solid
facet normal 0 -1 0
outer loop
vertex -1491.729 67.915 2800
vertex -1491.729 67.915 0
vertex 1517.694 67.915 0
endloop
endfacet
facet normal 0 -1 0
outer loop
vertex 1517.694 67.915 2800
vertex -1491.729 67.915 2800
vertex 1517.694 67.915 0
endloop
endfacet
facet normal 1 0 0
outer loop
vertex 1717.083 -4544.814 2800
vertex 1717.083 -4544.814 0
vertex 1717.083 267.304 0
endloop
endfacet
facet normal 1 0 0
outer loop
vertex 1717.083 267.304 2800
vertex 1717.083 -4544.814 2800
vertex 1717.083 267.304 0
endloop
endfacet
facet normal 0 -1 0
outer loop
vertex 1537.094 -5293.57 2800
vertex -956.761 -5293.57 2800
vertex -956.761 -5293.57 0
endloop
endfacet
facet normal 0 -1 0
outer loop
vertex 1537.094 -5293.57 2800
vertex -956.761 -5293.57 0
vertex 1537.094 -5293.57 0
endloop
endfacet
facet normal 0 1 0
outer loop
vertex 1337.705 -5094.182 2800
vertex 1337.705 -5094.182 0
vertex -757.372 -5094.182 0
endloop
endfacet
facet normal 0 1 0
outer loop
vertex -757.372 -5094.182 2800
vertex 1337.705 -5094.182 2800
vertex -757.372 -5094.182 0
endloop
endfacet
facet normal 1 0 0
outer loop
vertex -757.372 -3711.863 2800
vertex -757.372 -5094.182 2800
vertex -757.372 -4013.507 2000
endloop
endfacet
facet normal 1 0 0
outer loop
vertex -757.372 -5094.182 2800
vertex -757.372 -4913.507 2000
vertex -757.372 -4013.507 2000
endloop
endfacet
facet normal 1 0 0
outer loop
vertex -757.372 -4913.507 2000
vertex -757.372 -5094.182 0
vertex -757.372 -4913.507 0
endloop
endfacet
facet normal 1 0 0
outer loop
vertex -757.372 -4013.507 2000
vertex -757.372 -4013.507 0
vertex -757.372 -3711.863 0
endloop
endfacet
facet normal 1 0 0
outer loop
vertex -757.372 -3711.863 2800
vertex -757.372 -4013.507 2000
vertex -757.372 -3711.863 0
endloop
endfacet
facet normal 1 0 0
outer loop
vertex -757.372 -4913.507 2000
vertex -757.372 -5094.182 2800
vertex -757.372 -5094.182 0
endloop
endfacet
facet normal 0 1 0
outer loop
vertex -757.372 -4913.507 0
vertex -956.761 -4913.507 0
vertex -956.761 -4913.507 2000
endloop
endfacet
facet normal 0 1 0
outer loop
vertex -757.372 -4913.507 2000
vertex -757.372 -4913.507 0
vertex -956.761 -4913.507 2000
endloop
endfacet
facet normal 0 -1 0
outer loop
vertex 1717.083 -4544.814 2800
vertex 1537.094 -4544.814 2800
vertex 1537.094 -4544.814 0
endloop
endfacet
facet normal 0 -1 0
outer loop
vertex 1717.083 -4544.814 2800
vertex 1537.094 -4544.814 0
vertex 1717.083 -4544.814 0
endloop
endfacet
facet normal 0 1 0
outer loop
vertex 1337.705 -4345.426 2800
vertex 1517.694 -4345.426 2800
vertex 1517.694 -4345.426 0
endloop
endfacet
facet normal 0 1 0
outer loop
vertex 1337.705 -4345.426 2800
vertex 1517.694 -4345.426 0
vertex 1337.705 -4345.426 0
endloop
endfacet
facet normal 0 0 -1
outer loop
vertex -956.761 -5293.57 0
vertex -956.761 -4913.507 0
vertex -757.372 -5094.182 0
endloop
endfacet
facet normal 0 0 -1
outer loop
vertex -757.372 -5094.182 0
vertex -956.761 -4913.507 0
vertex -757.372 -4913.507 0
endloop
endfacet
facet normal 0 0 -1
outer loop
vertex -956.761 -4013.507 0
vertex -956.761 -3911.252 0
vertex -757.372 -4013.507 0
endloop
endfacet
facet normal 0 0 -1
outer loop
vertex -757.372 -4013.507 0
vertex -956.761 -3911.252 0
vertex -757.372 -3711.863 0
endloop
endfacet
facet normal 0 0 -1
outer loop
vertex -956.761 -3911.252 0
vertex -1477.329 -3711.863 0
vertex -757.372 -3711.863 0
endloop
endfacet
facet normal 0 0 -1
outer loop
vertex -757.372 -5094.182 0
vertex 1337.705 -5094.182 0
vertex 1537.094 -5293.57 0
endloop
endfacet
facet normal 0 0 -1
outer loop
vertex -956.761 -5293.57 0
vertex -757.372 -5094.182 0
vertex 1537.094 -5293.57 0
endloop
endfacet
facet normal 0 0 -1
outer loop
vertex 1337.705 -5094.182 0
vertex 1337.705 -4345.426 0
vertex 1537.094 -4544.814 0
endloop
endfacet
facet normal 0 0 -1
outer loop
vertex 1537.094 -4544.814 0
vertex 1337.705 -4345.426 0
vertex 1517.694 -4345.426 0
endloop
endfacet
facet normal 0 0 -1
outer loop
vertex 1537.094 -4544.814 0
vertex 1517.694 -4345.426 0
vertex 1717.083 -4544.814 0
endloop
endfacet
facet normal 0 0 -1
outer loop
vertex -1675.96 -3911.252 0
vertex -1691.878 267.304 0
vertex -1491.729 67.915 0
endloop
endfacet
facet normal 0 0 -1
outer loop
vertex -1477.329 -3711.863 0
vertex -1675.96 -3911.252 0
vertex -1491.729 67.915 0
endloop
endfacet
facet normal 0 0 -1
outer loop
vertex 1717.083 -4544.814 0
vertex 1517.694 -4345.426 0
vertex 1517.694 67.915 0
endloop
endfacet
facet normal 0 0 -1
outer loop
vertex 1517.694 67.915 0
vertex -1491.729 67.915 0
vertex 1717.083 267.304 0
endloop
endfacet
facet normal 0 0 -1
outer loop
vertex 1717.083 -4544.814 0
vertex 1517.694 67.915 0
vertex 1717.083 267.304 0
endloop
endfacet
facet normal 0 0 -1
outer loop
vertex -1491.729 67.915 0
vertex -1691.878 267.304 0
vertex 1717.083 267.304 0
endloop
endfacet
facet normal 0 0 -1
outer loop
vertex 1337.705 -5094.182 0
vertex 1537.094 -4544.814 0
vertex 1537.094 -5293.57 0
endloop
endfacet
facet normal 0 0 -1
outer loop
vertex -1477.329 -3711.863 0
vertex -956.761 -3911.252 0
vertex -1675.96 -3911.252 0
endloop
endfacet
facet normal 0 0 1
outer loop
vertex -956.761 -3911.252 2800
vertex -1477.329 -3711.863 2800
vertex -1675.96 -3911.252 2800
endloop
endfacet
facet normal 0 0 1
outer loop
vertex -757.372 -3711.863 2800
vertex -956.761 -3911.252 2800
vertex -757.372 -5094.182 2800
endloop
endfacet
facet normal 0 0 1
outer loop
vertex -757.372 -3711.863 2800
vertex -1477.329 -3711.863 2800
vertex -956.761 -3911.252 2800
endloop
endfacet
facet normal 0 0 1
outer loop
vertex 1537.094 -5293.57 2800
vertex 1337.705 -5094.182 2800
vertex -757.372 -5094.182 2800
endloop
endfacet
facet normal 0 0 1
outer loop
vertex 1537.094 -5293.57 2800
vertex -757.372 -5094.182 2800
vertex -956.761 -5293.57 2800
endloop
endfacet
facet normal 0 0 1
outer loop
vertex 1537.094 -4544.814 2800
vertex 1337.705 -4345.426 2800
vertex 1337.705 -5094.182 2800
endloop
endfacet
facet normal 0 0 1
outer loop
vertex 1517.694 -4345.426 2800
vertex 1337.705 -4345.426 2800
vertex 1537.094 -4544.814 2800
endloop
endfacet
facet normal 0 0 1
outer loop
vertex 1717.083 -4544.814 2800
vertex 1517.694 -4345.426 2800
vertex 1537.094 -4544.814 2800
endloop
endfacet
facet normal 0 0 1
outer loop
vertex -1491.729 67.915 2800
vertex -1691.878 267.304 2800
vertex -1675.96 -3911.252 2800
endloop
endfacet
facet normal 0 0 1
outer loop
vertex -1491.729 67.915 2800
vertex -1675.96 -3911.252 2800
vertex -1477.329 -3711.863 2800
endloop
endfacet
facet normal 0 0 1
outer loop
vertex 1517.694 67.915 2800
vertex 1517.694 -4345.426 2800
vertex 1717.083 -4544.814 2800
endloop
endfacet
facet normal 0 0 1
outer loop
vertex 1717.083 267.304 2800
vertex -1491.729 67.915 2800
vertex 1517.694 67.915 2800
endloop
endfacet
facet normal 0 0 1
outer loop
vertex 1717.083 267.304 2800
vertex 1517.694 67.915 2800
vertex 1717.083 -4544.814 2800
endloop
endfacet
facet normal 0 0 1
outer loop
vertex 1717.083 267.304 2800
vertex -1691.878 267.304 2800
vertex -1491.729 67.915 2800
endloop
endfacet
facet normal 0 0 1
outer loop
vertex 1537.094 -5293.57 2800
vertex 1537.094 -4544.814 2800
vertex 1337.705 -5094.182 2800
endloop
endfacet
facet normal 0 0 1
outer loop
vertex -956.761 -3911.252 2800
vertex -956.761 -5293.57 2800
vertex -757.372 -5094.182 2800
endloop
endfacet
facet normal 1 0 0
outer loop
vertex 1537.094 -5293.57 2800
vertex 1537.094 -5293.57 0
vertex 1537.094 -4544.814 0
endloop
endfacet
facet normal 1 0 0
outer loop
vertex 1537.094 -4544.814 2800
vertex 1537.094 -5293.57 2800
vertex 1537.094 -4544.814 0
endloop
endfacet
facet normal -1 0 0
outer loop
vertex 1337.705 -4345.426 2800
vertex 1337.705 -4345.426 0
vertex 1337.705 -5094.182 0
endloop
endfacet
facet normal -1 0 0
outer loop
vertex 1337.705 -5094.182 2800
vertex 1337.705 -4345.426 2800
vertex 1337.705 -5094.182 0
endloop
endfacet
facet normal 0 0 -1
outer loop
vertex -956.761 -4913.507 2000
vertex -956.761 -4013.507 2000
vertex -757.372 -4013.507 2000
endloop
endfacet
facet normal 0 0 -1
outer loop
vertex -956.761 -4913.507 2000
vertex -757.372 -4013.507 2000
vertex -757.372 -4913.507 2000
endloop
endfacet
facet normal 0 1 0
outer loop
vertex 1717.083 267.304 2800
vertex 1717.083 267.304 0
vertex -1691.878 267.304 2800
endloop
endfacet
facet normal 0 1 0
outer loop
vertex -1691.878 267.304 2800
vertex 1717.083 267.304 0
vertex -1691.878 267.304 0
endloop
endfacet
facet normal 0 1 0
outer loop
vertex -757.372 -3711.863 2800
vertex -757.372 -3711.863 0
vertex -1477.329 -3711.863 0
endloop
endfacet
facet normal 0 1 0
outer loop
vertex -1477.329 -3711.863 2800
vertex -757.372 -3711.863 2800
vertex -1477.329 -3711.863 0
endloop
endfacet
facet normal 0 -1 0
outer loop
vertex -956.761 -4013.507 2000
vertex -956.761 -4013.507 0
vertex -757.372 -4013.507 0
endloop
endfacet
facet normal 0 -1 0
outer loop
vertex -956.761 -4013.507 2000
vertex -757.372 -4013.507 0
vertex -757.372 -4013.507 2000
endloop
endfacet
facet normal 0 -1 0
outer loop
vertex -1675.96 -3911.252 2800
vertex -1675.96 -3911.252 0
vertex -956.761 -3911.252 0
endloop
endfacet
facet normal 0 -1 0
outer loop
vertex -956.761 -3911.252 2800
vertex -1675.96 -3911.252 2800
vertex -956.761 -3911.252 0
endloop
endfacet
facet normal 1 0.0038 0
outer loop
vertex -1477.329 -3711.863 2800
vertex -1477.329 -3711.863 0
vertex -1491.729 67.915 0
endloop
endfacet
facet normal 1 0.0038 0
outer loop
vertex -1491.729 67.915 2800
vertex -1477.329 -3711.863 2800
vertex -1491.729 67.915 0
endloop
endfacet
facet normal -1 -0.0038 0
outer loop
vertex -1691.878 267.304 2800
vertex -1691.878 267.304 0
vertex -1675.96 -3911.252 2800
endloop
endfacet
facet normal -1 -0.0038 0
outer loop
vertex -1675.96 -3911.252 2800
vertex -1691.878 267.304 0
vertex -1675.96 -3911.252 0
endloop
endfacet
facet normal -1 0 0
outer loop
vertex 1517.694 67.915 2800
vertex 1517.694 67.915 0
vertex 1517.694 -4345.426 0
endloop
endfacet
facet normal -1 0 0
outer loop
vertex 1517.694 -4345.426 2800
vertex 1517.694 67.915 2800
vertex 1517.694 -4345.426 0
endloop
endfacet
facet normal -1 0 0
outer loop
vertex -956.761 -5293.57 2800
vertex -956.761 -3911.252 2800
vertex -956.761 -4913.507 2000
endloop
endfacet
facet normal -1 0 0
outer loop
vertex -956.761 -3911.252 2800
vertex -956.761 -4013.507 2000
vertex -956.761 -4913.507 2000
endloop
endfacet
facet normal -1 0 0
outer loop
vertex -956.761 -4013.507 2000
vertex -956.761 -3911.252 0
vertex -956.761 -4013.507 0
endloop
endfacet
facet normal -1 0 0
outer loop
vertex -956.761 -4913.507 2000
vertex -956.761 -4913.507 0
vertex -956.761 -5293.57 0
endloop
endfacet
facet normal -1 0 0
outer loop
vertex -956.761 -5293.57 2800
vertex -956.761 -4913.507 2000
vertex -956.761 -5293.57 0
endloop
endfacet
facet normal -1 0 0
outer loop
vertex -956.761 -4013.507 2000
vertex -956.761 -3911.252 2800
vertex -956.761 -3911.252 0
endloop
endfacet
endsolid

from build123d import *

# Parameters (mm, degrees)
F1_DEPTH = 2800
F2_W     = 900
F2_H     = 2000
F3_DEPTH = 199.3887424469


# Not quite as in the source:
# - a feature of the source that left no trace in its solid (it failed there, or was rolled back) is left out


with BuildPart() as f1:
    # F0 (on Top) → F1 (new body)
    with BuildSketch(Plane.XY):
        Polygon((1537.0936393738, -5293.5702800751), (1537.0936393738, -4544.8143482208), (1717.0830965042, -4544.8143482208), (1717.0830965042, 267.3035189509), (-1691.8783106137, 267.3035189509), (-1675.9599854953, -3911.2515449524), (-956.7605257034, -3911.2515449524), (-956.7605257034, -5293.5702800751), align=None)
        Polygon((-757.3717832565, -3711.8628025055), (-1477.3293733597, -3711.8628025055), (-1491.7285442352, 67.914776504), (1517.6943540573, 67.914776504), (1517.6943540573, -4345.4256057739), (1337.7048969269, -4345.4256057739), (1337.7048969269, -5094.1815376282), (-757.3717832565, -5094.1815376282), align=None, mode=Mode.SUBTRACT)
    extrude(amount=F1_DEPTH)

    # F2 (on face) → F3 (cut, through all)
    with BuildSketch(Plane(origin=(-956.7605257034, 0, 0), x_dir=(0, -1, 0), z_dir=(-1, 0, 0))):
        with Locations((4463.5073661804, 1000)):
            Rectangle(F2_W, F2_H)
    extrude(amount=-F3_DEPTH, mode=Mode.SUBTRACT)


solid = f1.part
